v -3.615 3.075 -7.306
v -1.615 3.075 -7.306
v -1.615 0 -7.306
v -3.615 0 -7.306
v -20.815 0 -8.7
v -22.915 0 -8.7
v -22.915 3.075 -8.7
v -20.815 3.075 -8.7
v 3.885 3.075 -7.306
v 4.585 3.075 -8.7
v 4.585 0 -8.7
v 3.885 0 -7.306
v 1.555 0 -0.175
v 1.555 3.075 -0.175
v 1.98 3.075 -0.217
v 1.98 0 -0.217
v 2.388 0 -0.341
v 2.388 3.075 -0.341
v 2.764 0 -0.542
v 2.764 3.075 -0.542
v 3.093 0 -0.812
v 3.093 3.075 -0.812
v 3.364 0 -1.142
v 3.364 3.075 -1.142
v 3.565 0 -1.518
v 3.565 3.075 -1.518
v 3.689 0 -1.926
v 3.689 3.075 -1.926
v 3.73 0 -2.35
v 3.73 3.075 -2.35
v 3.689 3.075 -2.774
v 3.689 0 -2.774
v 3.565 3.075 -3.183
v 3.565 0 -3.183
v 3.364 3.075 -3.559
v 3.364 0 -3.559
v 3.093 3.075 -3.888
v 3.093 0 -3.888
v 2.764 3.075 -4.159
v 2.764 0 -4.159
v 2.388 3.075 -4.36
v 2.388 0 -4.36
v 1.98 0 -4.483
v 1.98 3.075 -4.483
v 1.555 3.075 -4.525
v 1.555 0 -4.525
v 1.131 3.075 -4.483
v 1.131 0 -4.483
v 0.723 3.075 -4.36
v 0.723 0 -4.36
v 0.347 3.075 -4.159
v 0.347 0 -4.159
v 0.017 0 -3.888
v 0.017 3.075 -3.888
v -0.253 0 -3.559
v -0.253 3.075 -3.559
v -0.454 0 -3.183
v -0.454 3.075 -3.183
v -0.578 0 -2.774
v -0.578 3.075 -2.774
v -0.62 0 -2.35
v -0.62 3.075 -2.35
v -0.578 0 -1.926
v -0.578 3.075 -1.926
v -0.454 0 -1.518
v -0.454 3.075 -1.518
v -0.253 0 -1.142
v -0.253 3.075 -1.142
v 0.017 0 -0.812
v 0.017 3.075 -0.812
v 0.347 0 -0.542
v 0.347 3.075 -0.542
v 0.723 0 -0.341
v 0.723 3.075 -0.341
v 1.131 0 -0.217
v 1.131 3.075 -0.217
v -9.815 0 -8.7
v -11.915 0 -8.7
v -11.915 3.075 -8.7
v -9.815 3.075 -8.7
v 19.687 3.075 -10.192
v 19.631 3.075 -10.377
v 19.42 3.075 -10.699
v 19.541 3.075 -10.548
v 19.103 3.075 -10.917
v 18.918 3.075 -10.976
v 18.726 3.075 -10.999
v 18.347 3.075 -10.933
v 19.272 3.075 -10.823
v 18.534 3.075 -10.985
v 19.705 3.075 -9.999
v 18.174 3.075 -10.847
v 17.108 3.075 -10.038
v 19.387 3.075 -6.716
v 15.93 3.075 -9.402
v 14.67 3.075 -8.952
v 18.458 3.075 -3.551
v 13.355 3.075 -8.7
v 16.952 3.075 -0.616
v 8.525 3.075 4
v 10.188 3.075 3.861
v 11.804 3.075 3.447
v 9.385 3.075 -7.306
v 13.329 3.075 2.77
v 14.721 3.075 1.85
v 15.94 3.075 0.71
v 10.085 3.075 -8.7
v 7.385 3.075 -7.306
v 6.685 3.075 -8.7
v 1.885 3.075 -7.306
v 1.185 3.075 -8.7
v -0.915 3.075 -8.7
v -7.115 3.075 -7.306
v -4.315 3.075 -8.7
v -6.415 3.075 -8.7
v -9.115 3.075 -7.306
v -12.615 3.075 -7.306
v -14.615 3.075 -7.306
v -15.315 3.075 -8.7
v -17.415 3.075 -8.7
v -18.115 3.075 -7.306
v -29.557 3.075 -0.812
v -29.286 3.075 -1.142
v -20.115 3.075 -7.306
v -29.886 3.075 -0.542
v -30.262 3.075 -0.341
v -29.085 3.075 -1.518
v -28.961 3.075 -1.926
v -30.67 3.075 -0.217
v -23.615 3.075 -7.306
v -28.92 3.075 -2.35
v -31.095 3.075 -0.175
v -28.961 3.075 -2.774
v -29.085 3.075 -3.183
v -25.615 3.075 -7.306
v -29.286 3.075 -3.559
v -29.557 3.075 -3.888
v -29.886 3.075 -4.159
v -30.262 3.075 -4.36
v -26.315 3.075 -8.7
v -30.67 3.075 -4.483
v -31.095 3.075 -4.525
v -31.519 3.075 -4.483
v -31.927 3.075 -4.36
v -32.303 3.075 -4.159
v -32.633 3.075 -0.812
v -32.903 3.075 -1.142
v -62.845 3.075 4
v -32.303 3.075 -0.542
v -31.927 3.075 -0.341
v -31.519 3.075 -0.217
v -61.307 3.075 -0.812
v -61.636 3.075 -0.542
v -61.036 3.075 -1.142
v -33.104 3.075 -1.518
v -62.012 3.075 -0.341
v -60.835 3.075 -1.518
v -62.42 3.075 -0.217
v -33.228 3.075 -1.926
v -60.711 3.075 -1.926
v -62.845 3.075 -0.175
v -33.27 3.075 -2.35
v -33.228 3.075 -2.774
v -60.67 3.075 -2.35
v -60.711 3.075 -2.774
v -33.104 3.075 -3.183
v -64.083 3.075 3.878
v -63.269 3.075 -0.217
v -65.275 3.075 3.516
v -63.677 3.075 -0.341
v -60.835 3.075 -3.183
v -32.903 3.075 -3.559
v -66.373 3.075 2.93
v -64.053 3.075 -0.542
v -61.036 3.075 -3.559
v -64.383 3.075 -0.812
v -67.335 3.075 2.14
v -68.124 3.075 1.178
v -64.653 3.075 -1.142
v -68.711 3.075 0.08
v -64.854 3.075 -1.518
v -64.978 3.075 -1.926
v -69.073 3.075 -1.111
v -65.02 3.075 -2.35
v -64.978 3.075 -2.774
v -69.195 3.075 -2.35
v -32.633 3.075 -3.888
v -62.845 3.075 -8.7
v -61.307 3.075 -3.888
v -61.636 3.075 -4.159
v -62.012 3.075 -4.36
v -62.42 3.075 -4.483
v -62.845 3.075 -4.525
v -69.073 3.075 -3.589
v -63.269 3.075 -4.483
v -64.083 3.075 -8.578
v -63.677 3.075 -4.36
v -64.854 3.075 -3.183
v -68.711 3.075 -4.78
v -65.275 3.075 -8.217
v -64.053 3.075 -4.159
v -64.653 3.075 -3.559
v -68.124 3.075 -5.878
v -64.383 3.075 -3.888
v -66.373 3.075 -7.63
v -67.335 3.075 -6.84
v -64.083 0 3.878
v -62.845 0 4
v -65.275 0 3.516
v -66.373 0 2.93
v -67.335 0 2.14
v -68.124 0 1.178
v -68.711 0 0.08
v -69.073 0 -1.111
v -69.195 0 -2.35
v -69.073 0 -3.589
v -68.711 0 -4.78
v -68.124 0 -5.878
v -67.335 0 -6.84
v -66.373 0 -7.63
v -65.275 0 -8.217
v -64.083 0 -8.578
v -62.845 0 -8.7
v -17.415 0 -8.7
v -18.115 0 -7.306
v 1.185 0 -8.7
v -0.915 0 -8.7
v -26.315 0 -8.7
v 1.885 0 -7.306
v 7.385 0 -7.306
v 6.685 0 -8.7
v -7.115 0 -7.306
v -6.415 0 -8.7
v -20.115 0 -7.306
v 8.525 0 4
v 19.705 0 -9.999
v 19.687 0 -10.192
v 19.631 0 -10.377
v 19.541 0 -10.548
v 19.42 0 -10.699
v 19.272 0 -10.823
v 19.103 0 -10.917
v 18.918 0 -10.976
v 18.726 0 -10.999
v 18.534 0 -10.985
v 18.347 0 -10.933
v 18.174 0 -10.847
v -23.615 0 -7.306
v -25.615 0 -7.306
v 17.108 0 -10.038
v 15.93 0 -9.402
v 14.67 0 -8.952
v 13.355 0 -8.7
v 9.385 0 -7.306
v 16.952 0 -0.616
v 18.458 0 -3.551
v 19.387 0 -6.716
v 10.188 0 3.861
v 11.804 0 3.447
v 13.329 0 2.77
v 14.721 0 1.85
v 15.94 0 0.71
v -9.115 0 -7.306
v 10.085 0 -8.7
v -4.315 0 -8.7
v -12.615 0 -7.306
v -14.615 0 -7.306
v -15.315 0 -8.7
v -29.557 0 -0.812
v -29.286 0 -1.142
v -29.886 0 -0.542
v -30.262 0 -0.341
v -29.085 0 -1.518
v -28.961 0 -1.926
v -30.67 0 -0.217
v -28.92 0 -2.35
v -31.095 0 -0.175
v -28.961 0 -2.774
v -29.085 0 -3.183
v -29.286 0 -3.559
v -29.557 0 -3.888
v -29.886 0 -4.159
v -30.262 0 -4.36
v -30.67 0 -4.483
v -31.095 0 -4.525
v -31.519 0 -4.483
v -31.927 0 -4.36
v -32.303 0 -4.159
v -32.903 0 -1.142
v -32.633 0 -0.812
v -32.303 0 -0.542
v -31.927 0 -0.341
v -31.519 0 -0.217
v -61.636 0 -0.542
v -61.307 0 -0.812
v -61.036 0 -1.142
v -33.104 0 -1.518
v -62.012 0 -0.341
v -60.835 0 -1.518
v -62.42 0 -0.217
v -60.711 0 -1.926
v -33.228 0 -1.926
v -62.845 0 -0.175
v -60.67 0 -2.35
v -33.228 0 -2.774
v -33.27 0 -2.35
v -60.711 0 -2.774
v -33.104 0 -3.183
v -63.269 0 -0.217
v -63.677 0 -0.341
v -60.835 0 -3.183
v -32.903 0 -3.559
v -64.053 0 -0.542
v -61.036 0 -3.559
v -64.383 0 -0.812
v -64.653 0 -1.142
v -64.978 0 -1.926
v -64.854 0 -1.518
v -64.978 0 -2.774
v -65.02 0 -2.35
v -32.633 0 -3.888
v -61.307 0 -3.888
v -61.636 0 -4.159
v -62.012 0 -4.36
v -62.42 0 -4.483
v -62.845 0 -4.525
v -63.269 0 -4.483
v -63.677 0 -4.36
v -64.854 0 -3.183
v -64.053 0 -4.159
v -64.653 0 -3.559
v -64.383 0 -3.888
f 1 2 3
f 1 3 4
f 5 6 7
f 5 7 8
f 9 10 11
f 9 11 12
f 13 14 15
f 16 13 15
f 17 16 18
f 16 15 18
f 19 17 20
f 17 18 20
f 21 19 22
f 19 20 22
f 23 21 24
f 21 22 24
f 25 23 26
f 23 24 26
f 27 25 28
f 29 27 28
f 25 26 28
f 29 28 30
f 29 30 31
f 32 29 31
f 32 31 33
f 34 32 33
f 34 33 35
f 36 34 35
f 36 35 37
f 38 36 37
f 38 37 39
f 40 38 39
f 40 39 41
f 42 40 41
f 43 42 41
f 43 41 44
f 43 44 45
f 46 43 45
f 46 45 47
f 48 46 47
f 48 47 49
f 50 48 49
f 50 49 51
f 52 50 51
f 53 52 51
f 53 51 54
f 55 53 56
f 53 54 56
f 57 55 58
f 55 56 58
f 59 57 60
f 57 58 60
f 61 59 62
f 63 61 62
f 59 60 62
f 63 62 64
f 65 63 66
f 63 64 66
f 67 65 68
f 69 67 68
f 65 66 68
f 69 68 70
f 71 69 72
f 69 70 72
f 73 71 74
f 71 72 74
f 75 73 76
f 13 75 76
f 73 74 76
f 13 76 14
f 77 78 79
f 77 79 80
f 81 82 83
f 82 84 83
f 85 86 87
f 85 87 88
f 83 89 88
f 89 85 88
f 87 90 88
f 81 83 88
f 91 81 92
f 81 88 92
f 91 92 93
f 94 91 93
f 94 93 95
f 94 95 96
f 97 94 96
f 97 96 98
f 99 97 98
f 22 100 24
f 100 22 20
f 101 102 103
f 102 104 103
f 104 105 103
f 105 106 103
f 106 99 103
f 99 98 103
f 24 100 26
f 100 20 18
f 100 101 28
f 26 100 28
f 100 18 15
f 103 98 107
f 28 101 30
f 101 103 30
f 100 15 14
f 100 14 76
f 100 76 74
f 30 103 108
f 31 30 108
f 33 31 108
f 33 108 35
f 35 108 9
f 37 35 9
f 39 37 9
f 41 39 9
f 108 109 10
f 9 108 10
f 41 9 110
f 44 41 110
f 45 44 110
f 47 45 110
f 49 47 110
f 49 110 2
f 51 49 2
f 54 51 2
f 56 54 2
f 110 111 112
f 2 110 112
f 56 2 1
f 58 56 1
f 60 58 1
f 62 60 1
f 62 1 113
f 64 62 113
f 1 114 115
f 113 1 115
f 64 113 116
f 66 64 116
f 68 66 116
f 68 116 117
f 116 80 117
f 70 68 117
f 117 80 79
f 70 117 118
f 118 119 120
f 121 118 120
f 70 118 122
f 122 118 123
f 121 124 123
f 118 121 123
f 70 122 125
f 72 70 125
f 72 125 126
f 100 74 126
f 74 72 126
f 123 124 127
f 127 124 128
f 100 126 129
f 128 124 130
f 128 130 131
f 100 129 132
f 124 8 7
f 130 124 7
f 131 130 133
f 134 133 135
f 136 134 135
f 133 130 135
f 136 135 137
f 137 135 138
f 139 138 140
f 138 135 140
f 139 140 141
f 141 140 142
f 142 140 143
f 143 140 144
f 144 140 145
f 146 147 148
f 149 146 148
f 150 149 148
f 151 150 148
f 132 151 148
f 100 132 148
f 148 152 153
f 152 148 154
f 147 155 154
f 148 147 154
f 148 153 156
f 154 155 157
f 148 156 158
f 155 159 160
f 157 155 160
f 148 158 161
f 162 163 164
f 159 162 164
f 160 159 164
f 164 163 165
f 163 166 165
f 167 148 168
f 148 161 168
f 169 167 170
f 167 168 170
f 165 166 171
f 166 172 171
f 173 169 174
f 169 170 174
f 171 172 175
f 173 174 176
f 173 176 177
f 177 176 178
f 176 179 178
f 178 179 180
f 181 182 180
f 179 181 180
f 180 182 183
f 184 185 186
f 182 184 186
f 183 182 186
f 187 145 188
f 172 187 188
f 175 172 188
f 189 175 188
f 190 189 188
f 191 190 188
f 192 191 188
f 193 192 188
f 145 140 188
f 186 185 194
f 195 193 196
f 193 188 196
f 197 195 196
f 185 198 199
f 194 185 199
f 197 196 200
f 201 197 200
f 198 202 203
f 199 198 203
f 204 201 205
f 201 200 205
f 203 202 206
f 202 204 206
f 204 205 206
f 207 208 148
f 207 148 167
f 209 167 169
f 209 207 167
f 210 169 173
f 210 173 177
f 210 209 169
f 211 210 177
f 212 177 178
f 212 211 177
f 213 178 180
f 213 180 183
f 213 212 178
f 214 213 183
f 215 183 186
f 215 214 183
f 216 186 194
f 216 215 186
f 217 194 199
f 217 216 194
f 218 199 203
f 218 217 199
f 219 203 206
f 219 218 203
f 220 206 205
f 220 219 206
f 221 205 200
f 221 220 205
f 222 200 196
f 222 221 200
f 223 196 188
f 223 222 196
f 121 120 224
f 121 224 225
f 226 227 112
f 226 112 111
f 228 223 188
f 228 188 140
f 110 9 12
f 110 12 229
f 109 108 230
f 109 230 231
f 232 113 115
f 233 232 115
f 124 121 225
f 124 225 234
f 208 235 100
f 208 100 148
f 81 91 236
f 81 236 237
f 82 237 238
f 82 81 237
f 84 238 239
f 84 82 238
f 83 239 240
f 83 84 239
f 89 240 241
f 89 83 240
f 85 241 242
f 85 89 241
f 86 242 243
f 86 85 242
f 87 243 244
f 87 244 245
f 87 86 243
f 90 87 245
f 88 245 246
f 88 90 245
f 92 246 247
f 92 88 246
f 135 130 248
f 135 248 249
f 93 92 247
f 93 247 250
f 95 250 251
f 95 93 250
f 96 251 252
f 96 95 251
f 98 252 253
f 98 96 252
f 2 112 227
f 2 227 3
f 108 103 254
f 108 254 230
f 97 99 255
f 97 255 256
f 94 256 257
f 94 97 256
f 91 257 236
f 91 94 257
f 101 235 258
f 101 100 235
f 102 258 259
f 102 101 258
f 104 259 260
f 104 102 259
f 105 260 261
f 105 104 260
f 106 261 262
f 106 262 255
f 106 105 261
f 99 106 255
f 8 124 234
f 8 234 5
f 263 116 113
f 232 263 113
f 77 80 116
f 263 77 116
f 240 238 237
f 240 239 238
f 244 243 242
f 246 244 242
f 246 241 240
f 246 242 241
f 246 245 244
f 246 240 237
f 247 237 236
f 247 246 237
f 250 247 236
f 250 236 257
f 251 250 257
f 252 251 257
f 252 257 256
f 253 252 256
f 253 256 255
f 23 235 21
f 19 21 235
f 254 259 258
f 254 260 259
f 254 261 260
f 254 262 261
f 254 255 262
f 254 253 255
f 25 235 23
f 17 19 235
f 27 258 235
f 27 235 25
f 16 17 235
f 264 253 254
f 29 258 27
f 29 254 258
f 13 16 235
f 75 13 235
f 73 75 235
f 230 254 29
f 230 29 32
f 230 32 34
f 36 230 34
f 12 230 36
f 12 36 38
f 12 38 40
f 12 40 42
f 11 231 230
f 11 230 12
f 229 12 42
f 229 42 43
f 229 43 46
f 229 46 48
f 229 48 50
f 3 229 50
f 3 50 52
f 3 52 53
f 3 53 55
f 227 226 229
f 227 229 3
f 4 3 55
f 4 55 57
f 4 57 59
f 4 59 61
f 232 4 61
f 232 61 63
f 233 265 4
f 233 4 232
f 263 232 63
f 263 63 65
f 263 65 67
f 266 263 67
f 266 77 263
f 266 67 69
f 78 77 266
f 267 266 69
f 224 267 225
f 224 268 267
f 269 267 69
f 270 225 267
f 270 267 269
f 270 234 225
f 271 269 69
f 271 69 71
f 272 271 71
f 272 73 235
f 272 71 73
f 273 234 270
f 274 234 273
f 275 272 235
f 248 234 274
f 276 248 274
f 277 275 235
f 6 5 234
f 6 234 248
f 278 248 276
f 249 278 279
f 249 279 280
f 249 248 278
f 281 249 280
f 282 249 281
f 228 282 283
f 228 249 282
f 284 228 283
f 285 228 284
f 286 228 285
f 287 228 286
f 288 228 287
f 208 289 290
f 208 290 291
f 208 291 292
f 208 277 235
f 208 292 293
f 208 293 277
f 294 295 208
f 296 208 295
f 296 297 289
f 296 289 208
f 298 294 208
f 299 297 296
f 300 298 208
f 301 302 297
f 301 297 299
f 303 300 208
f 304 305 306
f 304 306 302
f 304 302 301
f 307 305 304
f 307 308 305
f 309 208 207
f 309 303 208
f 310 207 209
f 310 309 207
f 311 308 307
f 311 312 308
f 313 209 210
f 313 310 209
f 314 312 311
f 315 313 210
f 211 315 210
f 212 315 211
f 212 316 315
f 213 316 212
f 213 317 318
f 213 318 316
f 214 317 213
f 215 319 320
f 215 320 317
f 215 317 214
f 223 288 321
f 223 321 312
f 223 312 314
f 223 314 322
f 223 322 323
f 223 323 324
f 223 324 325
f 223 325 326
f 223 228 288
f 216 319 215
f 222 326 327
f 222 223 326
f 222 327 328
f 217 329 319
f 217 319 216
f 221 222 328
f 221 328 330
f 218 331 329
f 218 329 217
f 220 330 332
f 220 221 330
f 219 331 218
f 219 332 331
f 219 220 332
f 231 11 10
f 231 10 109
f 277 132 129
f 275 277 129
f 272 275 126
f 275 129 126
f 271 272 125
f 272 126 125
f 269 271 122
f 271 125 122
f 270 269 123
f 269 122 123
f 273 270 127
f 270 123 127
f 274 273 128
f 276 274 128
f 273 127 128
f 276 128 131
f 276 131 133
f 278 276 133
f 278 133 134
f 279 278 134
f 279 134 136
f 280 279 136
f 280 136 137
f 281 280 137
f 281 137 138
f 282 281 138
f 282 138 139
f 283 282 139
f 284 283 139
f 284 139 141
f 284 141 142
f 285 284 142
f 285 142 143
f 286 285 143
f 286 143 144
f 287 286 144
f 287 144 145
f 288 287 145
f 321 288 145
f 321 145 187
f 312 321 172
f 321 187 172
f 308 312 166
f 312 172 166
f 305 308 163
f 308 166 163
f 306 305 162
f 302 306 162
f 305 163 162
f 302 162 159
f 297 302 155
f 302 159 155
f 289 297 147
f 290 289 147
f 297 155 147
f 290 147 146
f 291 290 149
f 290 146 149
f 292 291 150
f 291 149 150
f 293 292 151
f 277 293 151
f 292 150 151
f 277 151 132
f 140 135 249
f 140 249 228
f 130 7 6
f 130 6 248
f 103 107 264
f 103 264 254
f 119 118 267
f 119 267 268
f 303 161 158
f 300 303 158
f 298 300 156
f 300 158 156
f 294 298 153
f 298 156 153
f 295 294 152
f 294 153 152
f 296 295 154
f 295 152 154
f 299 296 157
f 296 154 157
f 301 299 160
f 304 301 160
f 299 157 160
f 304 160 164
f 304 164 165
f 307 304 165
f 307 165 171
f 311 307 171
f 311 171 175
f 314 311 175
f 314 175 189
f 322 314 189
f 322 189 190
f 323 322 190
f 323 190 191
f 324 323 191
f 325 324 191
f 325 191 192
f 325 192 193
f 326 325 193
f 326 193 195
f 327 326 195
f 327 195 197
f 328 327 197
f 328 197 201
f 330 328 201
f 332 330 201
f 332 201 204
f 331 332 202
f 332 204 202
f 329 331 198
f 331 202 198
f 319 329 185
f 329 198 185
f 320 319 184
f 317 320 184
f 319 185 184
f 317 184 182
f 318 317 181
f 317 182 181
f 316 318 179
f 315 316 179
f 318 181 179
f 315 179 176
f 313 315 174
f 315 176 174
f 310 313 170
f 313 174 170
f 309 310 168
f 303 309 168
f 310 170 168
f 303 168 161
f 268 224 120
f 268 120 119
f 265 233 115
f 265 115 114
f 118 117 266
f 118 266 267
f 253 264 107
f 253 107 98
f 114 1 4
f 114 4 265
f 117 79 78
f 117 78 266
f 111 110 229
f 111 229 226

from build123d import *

# Parameters (mm, degrees)
BOSS_EXTRUDE1_DEPTH = 3.075
SKETCH2_R           = 2.175
CUT_EXTRUDE2_DEPTH  = 6.35
BOSS_EXTRUDE2_DEPTH = 3.075
CUT_EXTRUDE3_DEPTH  = 10
FILLET1_R           = 10
CUT_EXTRUDE4_DEPTH  = 10


with BuildPart() as part:
    # Sketch1 → Boss-Extrude1 (new body)
    with BuildSketch(Plane(origin=(0, 0, 0), x_dir=(1, 0, 0), z_dir=(0, 1, 0))):
        with BuildLine():
            Line((-62.844661922, 8.700177936), (13.355338078, 8.700177936))
            ThreePointArc((13.355338078, 8.700177936), (19.705338078, 2.350177936), (13.355338078, -3.999822064))
            Line((13.355338078, -3.999822064), (-62.844661922, -3.999822064))
            ThreePointArc((-62.844661922, -3.999822064), (-69.194661922, 2.350177936), (-62.844661922, 8.700177936))
        make_face()
    extrude(amount=BOSS_EXTRUDE1_DEPTH)

    # Sketch2 → Cut-Extrude2 (cut)
    with BuildSketch(Plane(origin=(0, 3.075, 0), x_dir=(1, 0, 0), z_dir=(0, 1, 0))):
        with Locations(Location((-62.844661922, 2.350177936, 0), (0, 0, 270))):
            Circle(SKETCH2_R)
        with Locations(Location((-31.094661922, 2.350177936, 0), (0, 0, 270))):
            Circle(SKETCH2_R)
        with Locations(Location((1.555338078, 2.350177936, 0), (0, 0, 270))):
            Circle(SKETCH2_R)
    extrude(amount=-CUT_EXTRUDE2_DEPTH, mode=Mode.SUBTRACT)

    # Sketch3 → Boss-Extrude2 (add)
    with BuildSketch(Plane(origin=(0, 3.075, 0), x_dir=(1, 0, 0), z_dir=(0, 1, 0))):
        with BuildLine():
            Line((13.355338078, 8.700177936), (13.355338078, 2.350177936))
            Line((13.355338078, 2.350177936), (19.705338078, 2.350177936))
            Line((19.705338078, 2.350177936), (19.705338078, 9.999403669))
            ThreePointArc((19.705338078, 9.999403669), (19.189460997, 10.874403669), (18.174088078, 10.846618776))
            ThreePointArc((18.174088078, 10.846618776), (15.930319915, 9.401611756), (13.355338078, 8.700177936))
        make_face()
    extrude(amount=-BOSS_EXTRUDE2_DEPTH)

    # Sketch4 → Cut-Extrude3 (cut)
    with BuildSketch(Plane(origin=(0, 3.075, 0), x_dir=(1, 0, 0), z_dir=(0, 1, 0))):
        with BuildLine():
            Line((19.705338078, 9.999403669), (19.705338078, -6.000596331))
            Line((19.705338078, -6.000596331), (9.205338078, -6.000596331))
            ThreePointArc((9.205338078, -6.000596331), (16.836220051, 0.436949875), (19.705338078, 9.999403669))
        make_face()
    extrude(amount=-CUT_EXTRUDE3_DEPTH, mode=Mode.SUBTRACT)

    # Fillet1
    fillet1_edges = [part.edges().sort_by_distance(p)[0] for p in [
        (12.654174153, 1.5375, 3.999822064),
    ]]
    fillet(fillet1_edges, radius=FILLET1_R)

    # Sketch5 → Cut-Extrude4 (cut)
    with BuildSketch(Plane(origin=(0, 3.075, 0), x_dir=(1, 0, 0), z_dir=(0, 1, 0))):
        Polygon((-4.314661922, 8.700177936), (-0.914661922, 8.700177936), (-1.614661922, 7.306047383), (-3.614661922, 7.306047383), align=None)
        Polygon((-9.814661922, 8.700177936), (-9.114661922, 7.306047383), (-7.114661922, 7.306047383), (-6.414661922, 8.700177936), align=None)
        Polygon((1.185338078, 8.700177936), (4.585338078, 8.700177936), (3.885338078, 7.306047383), (1.885338078, 7.306047383), align=None)
        Polygon((6.685338078, 8.700177936), (10.085338078, 8.700177936), (9.385338078, 7.306047383), (7.385338078, 7.306047383), align=None)
        Polygon((-15.314661922, 8.700177936), (-11.914661922, 8.700177936), (-12.614661922, 7.306047383), (-14.614661922, 7.306047383), align=None)
        Polygon((-20.814661922, 8.700177936), (-17.414661922, 8.700177936), (-18.114661922, 7.306047383), (-20.114661922, 7.306047383), align=None)
        Polygon((-26.314661922, 8.700177936), (-22.914661922, 8.700177936), (-23.614661922, 7.306047383), (-25.614661922, 7.306047383), align=None)
    extrude(amount=-CUT_EXTRUDE4_DEPTH, mode=Mode.SUBTRACT)


solid = part.part
